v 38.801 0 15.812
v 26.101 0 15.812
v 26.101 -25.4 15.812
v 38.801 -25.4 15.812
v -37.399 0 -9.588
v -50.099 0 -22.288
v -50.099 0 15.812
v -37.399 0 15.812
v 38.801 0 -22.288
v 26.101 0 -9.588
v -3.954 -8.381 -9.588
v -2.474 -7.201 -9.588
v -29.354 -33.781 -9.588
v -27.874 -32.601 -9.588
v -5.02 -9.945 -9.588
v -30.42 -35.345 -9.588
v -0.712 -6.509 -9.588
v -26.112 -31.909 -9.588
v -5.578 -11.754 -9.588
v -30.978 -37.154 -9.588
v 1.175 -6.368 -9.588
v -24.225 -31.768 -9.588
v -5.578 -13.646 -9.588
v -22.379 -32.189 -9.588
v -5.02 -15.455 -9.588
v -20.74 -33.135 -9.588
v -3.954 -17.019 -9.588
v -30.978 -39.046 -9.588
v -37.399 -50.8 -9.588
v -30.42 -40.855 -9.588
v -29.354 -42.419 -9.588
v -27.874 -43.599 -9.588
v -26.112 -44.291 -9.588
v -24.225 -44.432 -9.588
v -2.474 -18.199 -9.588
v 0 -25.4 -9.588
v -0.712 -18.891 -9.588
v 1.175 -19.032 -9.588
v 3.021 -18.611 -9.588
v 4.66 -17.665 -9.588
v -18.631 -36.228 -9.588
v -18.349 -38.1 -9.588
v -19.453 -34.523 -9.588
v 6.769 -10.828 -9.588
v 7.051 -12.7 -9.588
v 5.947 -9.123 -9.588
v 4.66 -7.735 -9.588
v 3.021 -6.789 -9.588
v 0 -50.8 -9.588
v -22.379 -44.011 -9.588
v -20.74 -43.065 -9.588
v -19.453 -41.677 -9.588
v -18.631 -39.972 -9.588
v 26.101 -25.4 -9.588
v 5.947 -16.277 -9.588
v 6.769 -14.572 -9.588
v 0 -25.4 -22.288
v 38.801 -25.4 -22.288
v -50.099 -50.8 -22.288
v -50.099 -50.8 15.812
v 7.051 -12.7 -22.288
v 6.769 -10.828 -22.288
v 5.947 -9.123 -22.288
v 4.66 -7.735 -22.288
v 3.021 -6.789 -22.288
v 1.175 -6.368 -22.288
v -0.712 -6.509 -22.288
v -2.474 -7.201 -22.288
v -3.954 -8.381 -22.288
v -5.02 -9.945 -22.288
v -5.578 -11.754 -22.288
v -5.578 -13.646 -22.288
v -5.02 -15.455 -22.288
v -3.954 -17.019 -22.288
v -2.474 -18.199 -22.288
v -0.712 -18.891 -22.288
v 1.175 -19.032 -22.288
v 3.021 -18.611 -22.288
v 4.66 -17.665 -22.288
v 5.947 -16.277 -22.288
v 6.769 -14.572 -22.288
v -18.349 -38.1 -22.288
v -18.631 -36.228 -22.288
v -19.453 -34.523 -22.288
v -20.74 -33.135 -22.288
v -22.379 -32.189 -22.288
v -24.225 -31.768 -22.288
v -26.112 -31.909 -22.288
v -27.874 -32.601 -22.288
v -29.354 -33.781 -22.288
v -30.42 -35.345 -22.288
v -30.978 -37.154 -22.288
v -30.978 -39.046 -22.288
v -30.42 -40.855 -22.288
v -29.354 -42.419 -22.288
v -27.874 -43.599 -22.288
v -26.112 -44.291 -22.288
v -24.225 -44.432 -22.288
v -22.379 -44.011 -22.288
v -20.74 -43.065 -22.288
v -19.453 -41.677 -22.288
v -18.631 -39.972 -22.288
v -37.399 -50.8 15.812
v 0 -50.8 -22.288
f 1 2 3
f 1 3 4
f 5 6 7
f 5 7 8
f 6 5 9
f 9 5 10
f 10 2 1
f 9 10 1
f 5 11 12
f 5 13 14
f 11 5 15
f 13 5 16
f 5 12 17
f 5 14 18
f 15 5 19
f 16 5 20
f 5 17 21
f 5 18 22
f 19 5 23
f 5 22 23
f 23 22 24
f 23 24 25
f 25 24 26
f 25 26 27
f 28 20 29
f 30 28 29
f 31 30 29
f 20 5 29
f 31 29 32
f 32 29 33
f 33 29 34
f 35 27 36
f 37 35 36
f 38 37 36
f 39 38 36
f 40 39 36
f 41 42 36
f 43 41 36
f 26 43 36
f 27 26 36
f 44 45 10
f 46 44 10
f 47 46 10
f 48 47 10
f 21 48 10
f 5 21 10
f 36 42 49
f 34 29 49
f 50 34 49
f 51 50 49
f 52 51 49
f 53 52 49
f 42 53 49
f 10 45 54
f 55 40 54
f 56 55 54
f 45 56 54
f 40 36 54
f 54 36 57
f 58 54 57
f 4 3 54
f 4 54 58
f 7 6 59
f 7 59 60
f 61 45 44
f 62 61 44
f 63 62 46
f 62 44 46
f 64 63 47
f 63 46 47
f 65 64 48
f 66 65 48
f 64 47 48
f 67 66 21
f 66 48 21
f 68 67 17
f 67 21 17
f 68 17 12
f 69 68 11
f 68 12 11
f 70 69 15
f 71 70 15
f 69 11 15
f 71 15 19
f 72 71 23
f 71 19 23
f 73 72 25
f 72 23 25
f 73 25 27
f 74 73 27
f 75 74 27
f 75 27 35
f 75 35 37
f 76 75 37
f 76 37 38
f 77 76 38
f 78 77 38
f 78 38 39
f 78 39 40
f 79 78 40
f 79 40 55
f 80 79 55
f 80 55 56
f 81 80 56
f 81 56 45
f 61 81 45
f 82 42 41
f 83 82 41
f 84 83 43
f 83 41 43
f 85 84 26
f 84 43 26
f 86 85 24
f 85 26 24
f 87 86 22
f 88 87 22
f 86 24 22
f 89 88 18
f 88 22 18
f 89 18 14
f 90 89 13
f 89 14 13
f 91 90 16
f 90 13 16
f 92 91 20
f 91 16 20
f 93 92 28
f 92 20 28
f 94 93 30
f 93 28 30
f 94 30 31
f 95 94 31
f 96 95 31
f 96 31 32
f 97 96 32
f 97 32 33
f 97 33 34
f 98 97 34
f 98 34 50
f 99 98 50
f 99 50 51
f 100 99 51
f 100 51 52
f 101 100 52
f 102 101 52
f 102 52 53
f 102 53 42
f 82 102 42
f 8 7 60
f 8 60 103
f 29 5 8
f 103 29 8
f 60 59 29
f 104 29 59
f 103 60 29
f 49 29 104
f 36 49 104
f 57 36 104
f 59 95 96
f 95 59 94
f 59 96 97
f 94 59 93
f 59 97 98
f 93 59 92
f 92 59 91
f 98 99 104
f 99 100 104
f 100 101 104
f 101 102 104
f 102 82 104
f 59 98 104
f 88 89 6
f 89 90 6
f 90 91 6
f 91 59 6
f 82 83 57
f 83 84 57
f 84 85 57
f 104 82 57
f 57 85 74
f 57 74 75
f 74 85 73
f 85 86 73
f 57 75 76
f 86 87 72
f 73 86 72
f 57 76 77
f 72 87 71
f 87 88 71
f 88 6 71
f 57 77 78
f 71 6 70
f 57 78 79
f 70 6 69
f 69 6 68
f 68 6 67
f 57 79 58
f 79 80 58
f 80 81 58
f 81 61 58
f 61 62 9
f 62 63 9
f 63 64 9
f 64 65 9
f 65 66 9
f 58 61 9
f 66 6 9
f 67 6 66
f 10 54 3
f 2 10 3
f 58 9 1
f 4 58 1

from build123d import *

# Parameters (mm, degrees)
F0_W      = 88.9
F0_H      = 38.1
F1_DEPTH  = 50.8
F2_W      = 63.5
F2_H      = 25.4
F3_DEPTH  = 50.801
F5_DEPTH  = 25.4
F6_R      = 6.35
F8_DEPTH  = 12.701
F7_R      = 6.35
F9_DEPTH  = 25.401
F10_DEPTH = 38.102


with BuildPart() as f1:
    # F0 (on Front) → F1 (new body)
    with BuildSketch(Plane.XZ):
        with Locations((-5.6491568685, -3.2382767176)):
            Rectangle(F0_W, F0_H)
    extrude(amount=F1_DEPTH)

    # F2 (on face) → F3 (cut, through all)
    with BuildSketch(Plane.XZ.offset(50.8)):
        with Locations((-5.6491568685, 3.1117232824)):
            Rectangle(F2_W, F2_H)
    extrude(amount=-F3_DEPTH, mode=Mode.SUBTRACT)

    # F4 (on face) → F5 (cut)
    with BuildSketch(Plane.XZ.offset(50.8)):
        Polygon((26.1008431315, -9.5882767176), (0, -9.5882767176), (0, -22.2882767176), (38.8008431315, -22.2882767176), (38.8008431315, 15.8117232824), (26.1008431315, 15.8117232824), align=None)
    extrude(amount=-F5_DEPTH, mode=Mode.SUBTRACT)

    # F6 (on face) → F8 (cut, through all)
    with BuildSketch(Plane.XY.offset(-9.5882767176)):
        with Locations((0.7008431315, -12.7)):
            Circle(F6_R)
    extrude(amount=-F8_DEPTH, mode=Mode.SUBTRACT)

    # F7 (on face) → F9 (join, through all)
    with BuildSketch(Plane.XY.offset(-9.5882767176)):
        with Locations((-24.6991568685, -38.1)):
            Circle(F7_R)
    extrude(amount=F9_DEPTH)

    # F10 (cut, through all): a face of the model
    f10_faces = [f1.faces().sort_by_distance(p)[0] for p in [
        (-24.6991568685, -38.1, 15.8127232824),
    ]]
    extrude(f10_faces, amount=-F10_DEPTH, mode=Mode.SUBTRACT)


solid = f1.part
